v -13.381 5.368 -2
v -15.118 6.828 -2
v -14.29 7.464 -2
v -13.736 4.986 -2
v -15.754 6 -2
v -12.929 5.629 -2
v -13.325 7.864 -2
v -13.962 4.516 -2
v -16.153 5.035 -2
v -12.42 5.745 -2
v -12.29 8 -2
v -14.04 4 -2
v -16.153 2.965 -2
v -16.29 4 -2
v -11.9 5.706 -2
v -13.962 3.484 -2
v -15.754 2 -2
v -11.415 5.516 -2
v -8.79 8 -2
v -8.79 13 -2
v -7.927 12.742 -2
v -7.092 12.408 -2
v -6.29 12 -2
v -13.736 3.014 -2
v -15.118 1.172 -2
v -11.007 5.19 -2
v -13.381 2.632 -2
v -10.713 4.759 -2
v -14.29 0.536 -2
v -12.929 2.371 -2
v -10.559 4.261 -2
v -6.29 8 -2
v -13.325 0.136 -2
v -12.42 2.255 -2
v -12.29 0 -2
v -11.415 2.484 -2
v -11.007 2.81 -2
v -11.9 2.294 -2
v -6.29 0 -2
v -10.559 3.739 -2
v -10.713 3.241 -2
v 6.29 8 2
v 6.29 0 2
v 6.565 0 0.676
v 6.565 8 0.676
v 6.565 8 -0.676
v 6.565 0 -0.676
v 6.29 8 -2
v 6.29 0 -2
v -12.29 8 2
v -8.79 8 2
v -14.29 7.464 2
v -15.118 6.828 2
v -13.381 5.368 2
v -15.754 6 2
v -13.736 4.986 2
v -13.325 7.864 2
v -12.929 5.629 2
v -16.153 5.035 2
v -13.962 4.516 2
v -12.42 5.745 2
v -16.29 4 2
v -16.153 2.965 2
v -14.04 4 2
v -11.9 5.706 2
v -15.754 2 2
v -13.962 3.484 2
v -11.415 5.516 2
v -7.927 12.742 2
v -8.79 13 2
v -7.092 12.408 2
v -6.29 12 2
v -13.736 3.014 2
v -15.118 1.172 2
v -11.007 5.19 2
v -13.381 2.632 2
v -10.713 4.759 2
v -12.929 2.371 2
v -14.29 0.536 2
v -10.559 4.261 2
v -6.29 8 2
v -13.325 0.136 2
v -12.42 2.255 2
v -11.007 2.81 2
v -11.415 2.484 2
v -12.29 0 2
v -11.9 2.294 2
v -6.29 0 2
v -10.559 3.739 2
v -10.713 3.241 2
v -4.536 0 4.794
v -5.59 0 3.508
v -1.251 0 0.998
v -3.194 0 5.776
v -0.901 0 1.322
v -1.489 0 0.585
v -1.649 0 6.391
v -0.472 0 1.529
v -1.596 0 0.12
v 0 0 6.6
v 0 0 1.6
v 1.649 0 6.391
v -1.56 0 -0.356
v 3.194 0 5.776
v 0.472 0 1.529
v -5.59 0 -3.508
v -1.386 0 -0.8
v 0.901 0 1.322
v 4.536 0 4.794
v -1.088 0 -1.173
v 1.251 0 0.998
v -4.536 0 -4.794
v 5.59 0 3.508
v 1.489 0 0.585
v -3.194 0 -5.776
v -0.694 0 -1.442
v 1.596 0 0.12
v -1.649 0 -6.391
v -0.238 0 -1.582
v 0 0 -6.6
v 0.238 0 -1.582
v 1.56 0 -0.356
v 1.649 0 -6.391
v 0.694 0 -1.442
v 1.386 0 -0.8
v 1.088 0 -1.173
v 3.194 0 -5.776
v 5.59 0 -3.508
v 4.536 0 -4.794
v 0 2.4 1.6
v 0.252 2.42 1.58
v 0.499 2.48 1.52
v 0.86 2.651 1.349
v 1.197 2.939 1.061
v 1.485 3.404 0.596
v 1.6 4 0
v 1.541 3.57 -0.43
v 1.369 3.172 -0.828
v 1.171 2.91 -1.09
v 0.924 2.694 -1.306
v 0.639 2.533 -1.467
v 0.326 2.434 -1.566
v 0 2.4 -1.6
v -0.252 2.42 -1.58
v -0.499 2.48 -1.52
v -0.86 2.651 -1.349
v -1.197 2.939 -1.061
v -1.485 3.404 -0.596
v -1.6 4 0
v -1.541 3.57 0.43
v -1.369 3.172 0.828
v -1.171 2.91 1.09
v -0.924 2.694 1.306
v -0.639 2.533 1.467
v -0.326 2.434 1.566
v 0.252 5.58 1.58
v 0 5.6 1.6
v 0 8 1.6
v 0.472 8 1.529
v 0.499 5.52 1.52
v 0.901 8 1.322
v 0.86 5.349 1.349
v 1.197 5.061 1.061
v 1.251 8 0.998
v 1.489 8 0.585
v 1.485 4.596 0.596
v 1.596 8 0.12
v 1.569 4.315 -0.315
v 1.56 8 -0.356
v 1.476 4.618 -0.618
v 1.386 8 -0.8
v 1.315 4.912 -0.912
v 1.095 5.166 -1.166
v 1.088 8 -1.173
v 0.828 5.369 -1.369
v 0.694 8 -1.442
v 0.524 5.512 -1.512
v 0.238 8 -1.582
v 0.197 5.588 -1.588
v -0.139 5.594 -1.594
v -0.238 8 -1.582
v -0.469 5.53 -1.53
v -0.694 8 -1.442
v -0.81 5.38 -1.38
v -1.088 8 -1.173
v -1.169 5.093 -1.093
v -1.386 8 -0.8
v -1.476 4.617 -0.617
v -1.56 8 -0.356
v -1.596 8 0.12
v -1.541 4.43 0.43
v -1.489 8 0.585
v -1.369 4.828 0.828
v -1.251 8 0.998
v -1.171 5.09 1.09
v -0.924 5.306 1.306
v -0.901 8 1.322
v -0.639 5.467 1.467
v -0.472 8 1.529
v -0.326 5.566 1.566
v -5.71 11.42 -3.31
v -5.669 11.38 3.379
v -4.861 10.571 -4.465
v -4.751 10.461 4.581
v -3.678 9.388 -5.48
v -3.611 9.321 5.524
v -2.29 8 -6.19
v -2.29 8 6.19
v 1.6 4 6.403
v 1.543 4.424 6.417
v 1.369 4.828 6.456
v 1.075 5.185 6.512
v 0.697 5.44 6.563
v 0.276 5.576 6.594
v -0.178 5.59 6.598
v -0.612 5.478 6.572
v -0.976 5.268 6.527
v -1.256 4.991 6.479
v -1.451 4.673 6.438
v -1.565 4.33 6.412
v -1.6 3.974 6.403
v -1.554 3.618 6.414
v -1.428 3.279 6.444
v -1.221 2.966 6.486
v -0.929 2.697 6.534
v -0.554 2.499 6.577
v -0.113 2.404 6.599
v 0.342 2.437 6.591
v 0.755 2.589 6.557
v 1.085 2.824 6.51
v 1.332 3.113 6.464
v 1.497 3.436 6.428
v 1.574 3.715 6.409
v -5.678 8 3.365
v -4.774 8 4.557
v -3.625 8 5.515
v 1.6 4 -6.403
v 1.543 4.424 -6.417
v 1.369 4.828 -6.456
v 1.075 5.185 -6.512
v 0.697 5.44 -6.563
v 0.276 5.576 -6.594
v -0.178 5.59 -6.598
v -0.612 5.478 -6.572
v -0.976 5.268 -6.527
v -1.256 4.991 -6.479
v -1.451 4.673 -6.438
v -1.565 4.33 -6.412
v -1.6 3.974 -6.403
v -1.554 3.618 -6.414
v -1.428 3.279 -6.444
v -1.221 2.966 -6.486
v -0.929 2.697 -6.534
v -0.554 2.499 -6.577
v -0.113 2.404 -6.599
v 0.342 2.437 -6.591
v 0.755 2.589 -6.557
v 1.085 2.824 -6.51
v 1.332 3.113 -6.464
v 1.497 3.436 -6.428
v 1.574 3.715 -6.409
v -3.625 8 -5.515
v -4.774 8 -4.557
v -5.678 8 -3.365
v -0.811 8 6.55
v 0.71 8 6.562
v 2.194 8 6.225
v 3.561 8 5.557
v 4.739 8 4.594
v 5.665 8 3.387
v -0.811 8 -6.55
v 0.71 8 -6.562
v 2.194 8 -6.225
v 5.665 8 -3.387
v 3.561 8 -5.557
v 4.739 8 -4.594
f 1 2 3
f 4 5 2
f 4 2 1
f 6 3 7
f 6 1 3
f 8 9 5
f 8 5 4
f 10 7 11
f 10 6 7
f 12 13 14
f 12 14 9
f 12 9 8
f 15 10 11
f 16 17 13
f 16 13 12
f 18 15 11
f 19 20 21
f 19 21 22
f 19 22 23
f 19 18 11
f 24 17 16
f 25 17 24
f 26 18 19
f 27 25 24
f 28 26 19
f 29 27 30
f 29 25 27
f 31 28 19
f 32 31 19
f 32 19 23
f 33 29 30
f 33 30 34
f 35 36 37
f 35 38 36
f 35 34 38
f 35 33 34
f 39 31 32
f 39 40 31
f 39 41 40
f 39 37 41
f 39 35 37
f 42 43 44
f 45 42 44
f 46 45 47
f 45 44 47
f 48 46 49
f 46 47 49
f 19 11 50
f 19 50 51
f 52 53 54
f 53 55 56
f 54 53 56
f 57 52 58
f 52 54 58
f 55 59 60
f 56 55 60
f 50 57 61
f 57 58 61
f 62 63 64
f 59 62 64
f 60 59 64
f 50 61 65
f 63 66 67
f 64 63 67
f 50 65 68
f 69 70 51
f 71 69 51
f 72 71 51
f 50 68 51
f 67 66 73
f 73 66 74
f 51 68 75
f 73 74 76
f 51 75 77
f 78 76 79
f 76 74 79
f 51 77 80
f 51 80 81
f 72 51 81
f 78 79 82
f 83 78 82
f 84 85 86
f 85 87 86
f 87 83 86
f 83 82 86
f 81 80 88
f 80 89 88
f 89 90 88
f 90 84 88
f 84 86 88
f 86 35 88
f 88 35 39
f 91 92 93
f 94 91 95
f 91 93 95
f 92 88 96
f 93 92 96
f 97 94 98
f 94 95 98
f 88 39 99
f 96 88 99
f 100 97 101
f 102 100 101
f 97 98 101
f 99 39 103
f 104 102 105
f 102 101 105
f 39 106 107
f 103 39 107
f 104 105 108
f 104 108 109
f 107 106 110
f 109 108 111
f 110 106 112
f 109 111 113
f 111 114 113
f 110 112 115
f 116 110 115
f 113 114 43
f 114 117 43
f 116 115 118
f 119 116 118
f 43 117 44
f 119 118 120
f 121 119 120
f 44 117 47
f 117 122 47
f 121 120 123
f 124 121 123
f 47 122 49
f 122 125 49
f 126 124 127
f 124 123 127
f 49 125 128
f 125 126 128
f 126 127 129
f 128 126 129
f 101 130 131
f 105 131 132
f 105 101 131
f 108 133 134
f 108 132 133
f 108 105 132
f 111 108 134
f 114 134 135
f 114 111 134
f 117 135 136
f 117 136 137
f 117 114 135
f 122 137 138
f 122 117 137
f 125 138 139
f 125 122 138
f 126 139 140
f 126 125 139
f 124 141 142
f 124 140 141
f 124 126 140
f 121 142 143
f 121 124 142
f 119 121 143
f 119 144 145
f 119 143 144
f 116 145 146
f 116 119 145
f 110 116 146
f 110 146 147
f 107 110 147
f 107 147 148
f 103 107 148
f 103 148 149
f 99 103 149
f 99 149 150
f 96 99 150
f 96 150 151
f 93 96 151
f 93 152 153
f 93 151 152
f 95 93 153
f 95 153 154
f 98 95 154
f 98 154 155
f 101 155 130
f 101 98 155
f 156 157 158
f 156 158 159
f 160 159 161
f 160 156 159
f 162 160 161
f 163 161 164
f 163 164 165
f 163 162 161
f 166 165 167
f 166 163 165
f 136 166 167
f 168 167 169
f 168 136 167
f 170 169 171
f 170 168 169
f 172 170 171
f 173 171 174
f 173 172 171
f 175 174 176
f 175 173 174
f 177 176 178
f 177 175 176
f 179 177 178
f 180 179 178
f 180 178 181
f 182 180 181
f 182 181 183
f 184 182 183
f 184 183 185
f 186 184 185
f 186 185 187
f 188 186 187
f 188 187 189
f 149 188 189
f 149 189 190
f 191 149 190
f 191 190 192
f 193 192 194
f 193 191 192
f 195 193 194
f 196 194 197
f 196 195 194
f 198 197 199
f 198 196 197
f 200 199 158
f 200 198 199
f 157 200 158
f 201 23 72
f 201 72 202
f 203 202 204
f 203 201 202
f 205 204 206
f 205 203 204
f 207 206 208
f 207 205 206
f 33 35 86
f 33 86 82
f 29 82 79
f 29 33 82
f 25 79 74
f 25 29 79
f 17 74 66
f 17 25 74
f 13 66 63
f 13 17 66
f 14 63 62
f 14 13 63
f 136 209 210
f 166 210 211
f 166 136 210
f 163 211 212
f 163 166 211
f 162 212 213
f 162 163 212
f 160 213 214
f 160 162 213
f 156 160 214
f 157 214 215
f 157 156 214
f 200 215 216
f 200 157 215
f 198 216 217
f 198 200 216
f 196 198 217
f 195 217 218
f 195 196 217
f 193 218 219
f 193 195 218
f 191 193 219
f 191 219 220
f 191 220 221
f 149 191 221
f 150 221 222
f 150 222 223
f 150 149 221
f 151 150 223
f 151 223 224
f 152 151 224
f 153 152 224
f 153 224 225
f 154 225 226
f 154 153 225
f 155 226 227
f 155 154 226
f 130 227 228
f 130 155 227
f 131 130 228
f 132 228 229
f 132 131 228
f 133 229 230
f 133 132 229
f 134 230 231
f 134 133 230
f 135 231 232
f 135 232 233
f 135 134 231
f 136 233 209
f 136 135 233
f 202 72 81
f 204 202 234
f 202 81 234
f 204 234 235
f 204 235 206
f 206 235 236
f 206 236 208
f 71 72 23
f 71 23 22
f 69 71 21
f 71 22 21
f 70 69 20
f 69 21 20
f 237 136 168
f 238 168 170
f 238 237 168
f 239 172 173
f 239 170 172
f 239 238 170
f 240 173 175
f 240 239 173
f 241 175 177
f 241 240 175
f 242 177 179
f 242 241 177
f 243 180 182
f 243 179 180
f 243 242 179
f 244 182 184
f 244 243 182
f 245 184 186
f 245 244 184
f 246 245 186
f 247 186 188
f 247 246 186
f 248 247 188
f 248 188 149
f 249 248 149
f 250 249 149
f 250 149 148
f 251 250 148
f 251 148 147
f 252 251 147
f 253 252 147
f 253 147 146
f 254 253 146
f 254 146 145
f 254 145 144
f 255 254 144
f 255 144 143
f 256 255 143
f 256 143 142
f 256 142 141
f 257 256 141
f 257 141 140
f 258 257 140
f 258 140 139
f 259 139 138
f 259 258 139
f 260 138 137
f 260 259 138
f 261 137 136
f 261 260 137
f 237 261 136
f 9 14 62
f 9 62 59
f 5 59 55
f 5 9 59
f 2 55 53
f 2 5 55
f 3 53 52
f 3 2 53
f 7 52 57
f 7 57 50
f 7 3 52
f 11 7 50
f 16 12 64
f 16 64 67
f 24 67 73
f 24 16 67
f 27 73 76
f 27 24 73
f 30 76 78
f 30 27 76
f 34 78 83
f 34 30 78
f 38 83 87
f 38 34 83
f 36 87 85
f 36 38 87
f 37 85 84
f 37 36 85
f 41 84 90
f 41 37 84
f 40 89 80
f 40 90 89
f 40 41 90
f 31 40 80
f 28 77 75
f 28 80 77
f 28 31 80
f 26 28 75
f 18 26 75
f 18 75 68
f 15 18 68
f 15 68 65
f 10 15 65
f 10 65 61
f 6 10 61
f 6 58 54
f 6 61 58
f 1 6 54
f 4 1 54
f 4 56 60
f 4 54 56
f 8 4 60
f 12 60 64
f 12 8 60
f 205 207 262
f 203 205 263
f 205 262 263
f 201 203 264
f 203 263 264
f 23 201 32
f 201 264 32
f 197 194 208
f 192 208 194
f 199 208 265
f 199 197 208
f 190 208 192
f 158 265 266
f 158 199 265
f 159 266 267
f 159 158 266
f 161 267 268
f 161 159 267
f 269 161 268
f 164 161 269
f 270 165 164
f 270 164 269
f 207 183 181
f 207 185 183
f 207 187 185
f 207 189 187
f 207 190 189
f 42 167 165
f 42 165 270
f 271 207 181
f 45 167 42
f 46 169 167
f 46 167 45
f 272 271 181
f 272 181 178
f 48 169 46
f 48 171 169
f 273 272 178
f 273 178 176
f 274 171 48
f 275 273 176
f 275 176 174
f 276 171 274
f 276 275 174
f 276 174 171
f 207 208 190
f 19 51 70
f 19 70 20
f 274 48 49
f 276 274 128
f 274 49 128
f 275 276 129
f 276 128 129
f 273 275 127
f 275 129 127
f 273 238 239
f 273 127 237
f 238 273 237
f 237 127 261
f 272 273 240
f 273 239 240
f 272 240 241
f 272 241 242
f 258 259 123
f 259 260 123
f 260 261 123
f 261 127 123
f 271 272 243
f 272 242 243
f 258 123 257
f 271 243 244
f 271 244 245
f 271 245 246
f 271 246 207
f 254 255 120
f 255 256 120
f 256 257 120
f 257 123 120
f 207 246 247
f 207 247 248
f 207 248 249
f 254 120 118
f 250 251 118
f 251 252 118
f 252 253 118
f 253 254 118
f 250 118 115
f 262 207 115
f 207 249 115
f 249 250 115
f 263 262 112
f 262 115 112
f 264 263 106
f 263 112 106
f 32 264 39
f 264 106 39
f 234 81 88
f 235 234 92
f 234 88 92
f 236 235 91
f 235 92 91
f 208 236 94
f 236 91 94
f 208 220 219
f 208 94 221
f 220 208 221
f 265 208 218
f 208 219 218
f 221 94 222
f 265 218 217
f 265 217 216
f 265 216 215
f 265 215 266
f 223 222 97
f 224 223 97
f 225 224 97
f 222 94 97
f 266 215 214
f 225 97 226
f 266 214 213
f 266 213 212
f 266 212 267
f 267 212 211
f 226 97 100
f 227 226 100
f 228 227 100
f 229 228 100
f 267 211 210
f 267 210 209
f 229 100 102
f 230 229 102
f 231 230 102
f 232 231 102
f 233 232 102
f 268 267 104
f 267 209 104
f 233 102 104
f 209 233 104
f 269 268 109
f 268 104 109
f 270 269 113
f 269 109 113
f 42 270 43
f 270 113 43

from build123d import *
from build123d.topology import SkipClean

# Parameters (mm, degrees)
SKETCH1_R               = 1.6
BOSS_EXTRUDE1_DEPTH     = 8
CUT_EXTRUDE1_DEPTH      = 21.082666196
CUT_EXTRUDE1_DEPTH_BACK = 21.082666196
SKETCH2_R               = 1.75
SKETCH2_R_2             = 1.6
SKETCH4_W               = 2.5
SKETCH4_H               = 4
BOSS_EXTRUDE3_DEPTH     = 5
CHAMFER1_START          = 8
CHAMFER1_DEPTH          = 4
CHAMFER1_START_2        = -8
CHAMFER1_2_DEPTH        = 16
FILLET2_R               = 10


with BuildPart() as part:
    # Sketch1 → Boss-Extrude1 (new body)
    with BuildSketch(Plane(origin=(0, 0, 0), x_dir=(1, 0, 0), z_dir=(0, 1, 0))):
        with BuildLine():
            Line((-6.289674077, 2), (-16.289674077, 2))
            Line((-16.289674077, 2), (-16.289674077, -2))
            Line((-16.289674077, -2), (-6.289674077, -2))
            ThreePointArc((-6.289674077, -2), (0, -6.6), (6.289674077, -2))
            ThreePointArc((6.289674077, -2), (6.6, 0), (6.289674077, 2))
            ThreePointArc((6.289674077, 2), (0, 6.6), (-6.289674077, 2))
        make_face()
        with Locations(Location((0, 0, 0), (0, 0, 270))):
            Circle(SKETCH1_R, mode=Mode.SUBTRACT)
    extrude(amount=BOSS_EXTRUDE1_DEPTH)

    # Sketch2 → Cut-Extrude1 (cut, two sides: drawn at the far end of the back side and taken through both)
    with BuildSketch(Plane.XY.offset(2).offset(-CUT_EXTRUDE1_DEPTH_BACK)):
        with BuildLine():
            Line((-16.289674077, 8), (-16.289674077, 4))
            ThreePointArc((-16.289674077, 4), (-15.118101202, 6.828427125), (-12.289674077, 8))
            Line((-12.289674077, 8), (-16.289674077, 8))
        make_face()
        with BuildLine():
            Line((-16.289674077, 4), (-16.289674077, 0))
            Line((-16.289674077, 0), (-12.289674077, 0))
            ThreePointArc((-12.289674077, 0), (-15.118101202, 1.171572875), (-16.289674077, 4))
        make_face()
        with Locations(Location((-12.289674077, 4, 0), (0, 0, 180))):
            Circle(SKETCH2_R)
        with Locations((0, 4)):
            Circle(SKETCH2_R_2)
    extrude(amount=CUT_EXTRUDE1_DEPTH + CUT_EXTRUDE1_DEPTH_BACK, mode=Mode.SUBTRACT)

    # Sketch4 → Boss-Extrude3 (add)
    with BuildSketch(Plane(origin=(0, 8, 0), x_dir=(1, 0, 0), z_dir=(0, 1, 0))):
        with Locations((-7.539674077, 0)):
            Rectangle(SKETCH4_W, SKETCH4_H)
    extrude(amount=BOSS_EXTRUDE3_DEPTH)

    # Chamfer1: read off the stored shape, not the designer's step
    # Chamfer1 outline → Chamfer1 (add)
    with SkipClean():  # the faces are left unmerged after this step: merging them gives an invalid solid
        with BuildSketch(Plane(origin=(0, 0, 0), x_dir=(1, 0, 0), z_dir=(0, 1, 0)).offset(CHAMFER1_START)):
            with BuildLine():
                ThreePointArc((-6.289674077, -2), (6.6, 0), (-6.289674077, 2))
                Line((-6.289674077, 2), (-6.289674077, -2))
            make_face()
        extrude(amount=CHAMFER1_DEPTH)

    # Chamfer1 2 outline → Chamfer1 2 (cut)
    with BuildSketch(Plane.XY.offset(CHAMFER1_START_2)):
        Polygon((-2.289674077, 8), (8, 8), (8, 12), (-6.289674077, 12), align=None)
    extrude(amount=CHAMFER1_2_DEPTH, mode=Mode.SUBTRACT)

    # Fillet2
    # the kernel refuses this fillet: 10 mm, written as the material it takes off along each edge
    with BuildSketch(Plane(origin=(-6.289674077, 13, -8.25), x_dir=(4.06555678011955e-10, -1.0, 0), z_dir=(0, 0, 1))) as fillet2_piece_1:
        with BuildLine():
            CenterArc((9.700238938, -4.930095579), FILLET2_R, 150.461416233, 15.474348521)
            Line((-1e-09, -2.5), (0, 0))
            Line((0, 0), (1, 0))
        make_face()
    extrude(amount=16.5, mode=Mode.SUBTRACT)


solid = part.part
